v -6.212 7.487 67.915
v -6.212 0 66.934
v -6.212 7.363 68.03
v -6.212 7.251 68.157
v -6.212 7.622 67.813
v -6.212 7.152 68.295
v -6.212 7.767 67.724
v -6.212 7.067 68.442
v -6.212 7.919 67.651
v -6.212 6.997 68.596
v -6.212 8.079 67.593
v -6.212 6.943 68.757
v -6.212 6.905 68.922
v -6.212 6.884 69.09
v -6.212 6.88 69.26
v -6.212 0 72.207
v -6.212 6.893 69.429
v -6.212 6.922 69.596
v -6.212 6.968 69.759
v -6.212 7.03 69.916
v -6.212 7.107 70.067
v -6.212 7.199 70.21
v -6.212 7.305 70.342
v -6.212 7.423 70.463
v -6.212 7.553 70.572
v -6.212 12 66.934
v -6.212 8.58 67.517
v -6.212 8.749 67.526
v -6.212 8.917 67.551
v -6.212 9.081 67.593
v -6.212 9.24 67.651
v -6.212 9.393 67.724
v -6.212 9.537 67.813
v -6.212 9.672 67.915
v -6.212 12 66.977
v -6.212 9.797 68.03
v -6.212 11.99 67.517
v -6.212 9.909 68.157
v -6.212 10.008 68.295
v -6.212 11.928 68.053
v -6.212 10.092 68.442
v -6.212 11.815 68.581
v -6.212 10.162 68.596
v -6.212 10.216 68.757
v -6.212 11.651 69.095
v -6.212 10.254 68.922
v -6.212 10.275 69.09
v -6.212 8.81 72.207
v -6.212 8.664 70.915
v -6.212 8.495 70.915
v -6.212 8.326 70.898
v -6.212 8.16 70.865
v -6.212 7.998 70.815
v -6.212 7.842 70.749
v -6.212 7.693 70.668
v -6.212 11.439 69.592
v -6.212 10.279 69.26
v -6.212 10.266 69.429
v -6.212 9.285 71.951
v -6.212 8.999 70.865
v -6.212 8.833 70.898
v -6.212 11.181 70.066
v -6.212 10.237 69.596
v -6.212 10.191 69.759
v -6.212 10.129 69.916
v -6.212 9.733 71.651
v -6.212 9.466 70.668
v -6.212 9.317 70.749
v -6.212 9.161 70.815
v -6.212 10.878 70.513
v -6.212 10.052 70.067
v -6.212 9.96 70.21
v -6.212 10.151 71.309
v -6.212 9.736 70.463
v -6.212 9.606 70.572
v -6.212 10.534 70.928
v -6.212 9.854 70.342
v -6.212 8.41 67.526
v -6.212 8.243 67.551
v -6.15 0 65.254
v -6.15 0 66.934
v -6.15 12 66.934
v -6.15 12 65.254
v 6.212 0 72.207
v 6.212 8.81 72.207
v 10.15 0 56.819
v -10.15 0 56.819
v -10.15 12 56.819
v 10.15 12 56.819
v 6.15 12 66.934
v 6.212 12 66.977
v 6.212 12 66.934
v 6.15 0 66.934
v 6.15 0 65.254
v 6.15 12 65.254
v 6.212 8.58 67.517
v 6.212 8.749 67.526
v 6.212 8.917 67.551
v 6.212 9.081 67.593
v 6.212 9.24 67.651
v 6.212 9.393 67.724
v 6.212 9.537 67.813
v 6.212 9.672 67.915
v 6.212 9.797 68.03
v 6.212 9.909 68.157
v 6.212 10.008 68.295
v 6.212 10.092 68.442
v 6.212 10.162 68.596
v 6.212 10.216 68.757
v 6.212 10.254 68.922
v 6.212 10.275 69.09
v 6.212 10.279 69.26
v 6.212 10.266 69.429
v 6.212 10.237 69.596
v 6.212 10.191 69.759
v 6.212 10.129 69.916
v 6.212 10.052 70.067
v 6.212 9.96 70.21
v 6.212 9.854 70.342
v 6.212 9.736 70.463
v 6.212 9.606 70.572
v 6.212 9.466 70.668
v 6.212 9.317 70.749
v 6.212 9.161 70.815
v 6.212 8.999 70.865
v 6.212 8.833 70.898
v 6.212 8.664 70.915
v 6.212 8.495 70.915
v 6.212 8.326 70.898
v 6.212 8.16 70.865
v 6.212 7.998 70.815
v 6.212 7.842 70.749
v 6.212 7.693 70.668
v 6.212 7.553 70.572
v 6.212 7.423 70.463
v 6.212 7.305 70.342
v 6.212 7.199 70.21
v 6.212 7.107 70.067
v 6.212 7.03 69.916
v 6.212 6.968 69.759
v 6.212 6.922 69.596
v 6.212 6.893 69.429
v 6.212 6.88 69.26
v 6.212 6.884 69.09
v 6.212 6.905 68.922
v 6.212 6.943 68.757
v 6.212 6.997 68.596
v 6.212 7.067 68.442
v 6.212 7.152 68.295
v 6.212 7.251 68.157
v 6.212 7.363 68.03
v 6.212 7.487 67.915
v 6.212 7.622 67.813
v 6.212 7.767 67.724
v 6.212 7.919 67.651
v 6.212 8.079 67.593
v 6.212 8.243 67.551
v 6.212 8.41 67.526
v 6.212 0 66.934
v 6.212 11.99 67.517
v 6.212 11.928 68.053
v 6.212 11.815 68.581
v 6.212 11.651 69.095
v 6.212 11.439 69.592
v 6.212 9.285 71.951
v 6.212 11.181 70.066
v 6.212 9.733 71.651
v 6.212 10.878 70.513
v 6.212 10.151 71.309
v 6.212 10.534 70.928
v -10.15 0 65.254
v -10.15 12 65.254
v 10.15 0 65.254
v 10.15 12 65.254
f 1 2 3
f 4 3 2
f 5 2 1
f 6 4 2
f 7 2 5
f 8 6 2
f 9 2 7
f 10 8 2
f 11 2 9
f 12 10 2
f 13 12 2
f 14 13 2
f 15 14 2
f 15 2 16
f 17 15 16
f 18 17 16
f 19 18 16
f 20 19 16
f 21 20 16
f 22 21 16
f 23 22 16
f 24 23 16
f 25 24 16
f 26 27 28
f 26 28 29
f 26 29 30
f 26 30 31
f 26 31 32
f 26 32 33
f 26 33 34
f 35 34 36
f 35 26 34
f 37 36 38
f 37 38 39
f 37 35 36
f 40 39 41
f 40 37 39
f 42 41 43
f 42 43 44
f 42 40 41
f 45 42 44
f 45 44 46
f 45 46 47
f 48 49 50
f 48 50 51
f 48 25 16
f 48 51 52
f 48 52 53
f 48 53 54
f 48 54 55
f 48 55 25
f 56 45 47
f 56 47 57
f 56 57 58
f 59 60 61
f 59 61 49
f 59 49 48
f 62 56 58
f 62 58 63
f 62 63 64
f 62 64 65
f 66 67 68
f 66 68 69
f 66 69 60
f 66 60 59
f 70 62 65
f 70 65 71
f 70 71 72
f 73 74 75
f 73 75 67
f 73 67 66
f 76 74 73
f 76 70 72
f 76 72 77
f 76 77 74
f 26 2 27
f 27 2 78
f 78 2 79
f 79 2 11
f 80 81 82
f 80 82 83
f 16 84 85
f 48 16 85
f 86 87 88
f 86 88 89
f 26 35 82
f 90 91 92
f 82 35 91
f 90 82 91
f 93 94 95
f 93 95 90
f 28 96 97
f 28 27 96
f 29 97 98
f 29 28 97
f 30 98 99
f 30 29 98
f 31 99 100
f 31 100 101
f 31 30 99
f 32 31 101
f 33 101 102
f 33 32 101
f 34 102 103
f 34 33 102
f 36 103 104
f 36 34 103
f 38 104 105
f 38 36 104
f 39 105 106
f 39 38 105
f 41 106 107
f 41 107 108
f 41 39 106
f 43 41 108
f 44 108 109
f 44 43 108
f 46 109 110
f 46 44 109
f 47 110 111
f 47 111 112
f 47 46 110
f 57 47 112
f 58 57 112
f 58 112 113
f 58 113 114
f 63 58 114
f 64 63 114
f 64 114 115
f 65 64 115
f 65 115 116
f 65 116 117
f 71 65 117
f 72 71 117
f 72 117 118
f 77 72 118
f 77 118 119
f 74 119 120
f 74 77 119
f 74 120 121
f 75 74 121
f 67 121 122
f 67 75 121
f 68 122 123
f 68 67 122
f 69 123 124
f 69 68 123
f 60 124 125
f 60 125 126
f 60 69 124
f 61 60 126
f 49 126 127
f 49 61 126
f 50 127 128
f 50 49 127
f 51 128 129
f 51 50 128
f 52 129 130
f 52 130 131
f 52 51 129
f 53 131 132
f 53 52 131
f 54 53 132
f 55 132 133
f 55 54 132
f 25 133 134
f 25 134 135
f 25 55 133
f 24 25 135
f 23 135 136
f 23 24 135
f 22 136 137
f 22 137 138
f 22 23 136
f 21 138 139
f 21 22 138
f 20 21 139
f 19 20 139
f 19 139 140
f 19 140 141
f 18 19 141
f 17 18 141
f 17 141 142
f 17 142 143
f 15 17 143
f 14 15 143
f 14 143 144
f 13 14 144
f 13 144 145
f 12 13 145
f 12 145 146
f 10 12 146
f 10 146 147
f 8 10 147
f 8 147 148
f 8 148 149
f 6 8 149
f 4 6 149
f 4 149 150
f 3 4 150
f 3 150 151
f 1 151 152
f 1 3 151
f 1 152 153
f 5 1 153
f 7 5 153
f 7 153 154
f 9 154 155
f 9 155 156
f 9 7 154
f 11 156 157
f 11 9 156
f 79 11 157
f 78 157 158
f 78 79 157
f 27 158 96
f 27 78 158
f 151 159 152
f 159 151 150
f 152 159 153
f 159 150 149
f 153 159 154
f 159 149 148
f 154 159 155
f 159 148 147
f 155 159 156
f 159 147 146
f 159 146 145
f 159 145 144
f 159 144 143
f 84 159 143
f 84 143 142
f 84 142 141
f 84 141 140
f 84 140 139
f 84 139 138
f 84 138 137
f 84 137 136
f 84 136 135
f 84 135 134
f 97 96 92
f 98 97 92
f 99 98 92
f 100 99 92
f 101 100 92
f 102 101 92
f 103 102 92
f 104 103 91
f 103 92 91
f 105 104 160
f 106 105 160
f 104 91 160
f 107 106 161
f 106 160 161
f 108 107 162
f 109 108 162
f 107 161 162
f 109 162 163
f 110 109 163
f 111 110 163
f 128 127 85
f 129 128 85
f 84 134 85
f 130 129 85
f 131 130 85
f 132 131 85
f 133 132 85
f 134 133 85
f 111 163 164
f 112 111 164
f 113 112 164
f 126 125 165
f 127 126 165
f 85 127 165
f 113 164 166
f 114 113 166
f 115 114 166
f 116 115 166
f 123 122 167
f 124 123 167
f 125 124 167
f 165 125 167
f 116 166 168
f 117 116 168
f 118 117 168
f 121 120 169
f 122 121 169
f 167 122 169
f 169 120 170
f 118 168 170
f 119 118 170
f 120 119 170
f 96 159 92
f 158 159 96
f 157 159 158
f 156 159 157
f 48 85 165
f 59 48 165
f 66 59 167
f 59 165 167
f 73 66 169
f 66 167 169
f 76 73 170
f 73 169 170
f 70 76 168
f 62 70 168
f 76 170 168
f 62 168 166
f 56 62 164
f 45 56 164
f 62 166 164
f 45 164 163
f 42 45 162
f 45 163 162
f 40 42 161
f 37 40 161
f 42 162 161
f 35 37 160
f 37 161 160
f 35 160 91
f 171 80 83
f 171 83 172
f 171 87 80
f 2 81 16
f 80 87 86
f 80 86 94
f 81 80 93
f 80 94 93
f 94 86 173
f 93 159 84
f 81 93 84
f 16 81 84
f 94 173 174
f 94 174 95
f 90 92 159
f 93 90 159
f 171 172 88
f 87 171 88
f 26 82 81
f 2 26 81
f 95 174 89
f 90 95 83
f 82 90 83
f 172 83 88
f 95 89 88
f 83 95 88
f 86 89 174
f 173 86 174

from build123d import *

# Parameters (mm, degrees)
BOSS_EXTRUDE1_DEPTH = 12
SKETCH2_R           = 1.7
BOSS_EXTRUDE2_DEPTH = 6.2125


with BuildPart() as part:
    # Sketch1 → Boss-Extrude1 (new body)
    with BuildSketch(Plane(origin=(0, 0, 0), x_dir=(1, 0, 0), z_dir=(0, 1, 0))):
        Polygon((10.15, -65.254427144), (6.15, -65.254427144), (6.15, -66.934427144), (-6.15, -66.934427144), (-6.15, -65.254427144), (-10.15, -65.254427144), (-10.15, -56.819346079), (10.15, -56.819346079), align=None)
    extrude(amount=BOSS_EXTRUDE1_DEPTH)

    # Sketch2 → Boss-Extrude2 (add, symmetric)
    with BuildSketch(Plane(origin=(0, 0, 0), x_dir=(0, 0, -1), z_dir=(1, 0, 0))):
        with BuildLine():
            Line((-72.207292933, 5.999665069), (-72.207292933, 8.809665069))
            ThreePointArc((-72.207292933, 8.809665069), (-70.065734946, 11.180872507), (-66.977292933, 11.999665069))
            Line((-66.977292933, 11.999665069), (-66.934427144, 12))
            Line((-66.934427144, 12), (-66.934427144, 0))
            Line((-66.934427144, 0), (-72.207292933, 0))
            Line((-72.207292933, 0), (-72.207292933, 5.999665069))
        make_face()
        with Locations((-69.217292933, 8.579665069)):
            Circle(SKETCH2_R, mode=Mode.SUBTRACT)
    extrude(amount=BOSS_EXTRUDE2_DEPTH, both=True)


solid = part.part
